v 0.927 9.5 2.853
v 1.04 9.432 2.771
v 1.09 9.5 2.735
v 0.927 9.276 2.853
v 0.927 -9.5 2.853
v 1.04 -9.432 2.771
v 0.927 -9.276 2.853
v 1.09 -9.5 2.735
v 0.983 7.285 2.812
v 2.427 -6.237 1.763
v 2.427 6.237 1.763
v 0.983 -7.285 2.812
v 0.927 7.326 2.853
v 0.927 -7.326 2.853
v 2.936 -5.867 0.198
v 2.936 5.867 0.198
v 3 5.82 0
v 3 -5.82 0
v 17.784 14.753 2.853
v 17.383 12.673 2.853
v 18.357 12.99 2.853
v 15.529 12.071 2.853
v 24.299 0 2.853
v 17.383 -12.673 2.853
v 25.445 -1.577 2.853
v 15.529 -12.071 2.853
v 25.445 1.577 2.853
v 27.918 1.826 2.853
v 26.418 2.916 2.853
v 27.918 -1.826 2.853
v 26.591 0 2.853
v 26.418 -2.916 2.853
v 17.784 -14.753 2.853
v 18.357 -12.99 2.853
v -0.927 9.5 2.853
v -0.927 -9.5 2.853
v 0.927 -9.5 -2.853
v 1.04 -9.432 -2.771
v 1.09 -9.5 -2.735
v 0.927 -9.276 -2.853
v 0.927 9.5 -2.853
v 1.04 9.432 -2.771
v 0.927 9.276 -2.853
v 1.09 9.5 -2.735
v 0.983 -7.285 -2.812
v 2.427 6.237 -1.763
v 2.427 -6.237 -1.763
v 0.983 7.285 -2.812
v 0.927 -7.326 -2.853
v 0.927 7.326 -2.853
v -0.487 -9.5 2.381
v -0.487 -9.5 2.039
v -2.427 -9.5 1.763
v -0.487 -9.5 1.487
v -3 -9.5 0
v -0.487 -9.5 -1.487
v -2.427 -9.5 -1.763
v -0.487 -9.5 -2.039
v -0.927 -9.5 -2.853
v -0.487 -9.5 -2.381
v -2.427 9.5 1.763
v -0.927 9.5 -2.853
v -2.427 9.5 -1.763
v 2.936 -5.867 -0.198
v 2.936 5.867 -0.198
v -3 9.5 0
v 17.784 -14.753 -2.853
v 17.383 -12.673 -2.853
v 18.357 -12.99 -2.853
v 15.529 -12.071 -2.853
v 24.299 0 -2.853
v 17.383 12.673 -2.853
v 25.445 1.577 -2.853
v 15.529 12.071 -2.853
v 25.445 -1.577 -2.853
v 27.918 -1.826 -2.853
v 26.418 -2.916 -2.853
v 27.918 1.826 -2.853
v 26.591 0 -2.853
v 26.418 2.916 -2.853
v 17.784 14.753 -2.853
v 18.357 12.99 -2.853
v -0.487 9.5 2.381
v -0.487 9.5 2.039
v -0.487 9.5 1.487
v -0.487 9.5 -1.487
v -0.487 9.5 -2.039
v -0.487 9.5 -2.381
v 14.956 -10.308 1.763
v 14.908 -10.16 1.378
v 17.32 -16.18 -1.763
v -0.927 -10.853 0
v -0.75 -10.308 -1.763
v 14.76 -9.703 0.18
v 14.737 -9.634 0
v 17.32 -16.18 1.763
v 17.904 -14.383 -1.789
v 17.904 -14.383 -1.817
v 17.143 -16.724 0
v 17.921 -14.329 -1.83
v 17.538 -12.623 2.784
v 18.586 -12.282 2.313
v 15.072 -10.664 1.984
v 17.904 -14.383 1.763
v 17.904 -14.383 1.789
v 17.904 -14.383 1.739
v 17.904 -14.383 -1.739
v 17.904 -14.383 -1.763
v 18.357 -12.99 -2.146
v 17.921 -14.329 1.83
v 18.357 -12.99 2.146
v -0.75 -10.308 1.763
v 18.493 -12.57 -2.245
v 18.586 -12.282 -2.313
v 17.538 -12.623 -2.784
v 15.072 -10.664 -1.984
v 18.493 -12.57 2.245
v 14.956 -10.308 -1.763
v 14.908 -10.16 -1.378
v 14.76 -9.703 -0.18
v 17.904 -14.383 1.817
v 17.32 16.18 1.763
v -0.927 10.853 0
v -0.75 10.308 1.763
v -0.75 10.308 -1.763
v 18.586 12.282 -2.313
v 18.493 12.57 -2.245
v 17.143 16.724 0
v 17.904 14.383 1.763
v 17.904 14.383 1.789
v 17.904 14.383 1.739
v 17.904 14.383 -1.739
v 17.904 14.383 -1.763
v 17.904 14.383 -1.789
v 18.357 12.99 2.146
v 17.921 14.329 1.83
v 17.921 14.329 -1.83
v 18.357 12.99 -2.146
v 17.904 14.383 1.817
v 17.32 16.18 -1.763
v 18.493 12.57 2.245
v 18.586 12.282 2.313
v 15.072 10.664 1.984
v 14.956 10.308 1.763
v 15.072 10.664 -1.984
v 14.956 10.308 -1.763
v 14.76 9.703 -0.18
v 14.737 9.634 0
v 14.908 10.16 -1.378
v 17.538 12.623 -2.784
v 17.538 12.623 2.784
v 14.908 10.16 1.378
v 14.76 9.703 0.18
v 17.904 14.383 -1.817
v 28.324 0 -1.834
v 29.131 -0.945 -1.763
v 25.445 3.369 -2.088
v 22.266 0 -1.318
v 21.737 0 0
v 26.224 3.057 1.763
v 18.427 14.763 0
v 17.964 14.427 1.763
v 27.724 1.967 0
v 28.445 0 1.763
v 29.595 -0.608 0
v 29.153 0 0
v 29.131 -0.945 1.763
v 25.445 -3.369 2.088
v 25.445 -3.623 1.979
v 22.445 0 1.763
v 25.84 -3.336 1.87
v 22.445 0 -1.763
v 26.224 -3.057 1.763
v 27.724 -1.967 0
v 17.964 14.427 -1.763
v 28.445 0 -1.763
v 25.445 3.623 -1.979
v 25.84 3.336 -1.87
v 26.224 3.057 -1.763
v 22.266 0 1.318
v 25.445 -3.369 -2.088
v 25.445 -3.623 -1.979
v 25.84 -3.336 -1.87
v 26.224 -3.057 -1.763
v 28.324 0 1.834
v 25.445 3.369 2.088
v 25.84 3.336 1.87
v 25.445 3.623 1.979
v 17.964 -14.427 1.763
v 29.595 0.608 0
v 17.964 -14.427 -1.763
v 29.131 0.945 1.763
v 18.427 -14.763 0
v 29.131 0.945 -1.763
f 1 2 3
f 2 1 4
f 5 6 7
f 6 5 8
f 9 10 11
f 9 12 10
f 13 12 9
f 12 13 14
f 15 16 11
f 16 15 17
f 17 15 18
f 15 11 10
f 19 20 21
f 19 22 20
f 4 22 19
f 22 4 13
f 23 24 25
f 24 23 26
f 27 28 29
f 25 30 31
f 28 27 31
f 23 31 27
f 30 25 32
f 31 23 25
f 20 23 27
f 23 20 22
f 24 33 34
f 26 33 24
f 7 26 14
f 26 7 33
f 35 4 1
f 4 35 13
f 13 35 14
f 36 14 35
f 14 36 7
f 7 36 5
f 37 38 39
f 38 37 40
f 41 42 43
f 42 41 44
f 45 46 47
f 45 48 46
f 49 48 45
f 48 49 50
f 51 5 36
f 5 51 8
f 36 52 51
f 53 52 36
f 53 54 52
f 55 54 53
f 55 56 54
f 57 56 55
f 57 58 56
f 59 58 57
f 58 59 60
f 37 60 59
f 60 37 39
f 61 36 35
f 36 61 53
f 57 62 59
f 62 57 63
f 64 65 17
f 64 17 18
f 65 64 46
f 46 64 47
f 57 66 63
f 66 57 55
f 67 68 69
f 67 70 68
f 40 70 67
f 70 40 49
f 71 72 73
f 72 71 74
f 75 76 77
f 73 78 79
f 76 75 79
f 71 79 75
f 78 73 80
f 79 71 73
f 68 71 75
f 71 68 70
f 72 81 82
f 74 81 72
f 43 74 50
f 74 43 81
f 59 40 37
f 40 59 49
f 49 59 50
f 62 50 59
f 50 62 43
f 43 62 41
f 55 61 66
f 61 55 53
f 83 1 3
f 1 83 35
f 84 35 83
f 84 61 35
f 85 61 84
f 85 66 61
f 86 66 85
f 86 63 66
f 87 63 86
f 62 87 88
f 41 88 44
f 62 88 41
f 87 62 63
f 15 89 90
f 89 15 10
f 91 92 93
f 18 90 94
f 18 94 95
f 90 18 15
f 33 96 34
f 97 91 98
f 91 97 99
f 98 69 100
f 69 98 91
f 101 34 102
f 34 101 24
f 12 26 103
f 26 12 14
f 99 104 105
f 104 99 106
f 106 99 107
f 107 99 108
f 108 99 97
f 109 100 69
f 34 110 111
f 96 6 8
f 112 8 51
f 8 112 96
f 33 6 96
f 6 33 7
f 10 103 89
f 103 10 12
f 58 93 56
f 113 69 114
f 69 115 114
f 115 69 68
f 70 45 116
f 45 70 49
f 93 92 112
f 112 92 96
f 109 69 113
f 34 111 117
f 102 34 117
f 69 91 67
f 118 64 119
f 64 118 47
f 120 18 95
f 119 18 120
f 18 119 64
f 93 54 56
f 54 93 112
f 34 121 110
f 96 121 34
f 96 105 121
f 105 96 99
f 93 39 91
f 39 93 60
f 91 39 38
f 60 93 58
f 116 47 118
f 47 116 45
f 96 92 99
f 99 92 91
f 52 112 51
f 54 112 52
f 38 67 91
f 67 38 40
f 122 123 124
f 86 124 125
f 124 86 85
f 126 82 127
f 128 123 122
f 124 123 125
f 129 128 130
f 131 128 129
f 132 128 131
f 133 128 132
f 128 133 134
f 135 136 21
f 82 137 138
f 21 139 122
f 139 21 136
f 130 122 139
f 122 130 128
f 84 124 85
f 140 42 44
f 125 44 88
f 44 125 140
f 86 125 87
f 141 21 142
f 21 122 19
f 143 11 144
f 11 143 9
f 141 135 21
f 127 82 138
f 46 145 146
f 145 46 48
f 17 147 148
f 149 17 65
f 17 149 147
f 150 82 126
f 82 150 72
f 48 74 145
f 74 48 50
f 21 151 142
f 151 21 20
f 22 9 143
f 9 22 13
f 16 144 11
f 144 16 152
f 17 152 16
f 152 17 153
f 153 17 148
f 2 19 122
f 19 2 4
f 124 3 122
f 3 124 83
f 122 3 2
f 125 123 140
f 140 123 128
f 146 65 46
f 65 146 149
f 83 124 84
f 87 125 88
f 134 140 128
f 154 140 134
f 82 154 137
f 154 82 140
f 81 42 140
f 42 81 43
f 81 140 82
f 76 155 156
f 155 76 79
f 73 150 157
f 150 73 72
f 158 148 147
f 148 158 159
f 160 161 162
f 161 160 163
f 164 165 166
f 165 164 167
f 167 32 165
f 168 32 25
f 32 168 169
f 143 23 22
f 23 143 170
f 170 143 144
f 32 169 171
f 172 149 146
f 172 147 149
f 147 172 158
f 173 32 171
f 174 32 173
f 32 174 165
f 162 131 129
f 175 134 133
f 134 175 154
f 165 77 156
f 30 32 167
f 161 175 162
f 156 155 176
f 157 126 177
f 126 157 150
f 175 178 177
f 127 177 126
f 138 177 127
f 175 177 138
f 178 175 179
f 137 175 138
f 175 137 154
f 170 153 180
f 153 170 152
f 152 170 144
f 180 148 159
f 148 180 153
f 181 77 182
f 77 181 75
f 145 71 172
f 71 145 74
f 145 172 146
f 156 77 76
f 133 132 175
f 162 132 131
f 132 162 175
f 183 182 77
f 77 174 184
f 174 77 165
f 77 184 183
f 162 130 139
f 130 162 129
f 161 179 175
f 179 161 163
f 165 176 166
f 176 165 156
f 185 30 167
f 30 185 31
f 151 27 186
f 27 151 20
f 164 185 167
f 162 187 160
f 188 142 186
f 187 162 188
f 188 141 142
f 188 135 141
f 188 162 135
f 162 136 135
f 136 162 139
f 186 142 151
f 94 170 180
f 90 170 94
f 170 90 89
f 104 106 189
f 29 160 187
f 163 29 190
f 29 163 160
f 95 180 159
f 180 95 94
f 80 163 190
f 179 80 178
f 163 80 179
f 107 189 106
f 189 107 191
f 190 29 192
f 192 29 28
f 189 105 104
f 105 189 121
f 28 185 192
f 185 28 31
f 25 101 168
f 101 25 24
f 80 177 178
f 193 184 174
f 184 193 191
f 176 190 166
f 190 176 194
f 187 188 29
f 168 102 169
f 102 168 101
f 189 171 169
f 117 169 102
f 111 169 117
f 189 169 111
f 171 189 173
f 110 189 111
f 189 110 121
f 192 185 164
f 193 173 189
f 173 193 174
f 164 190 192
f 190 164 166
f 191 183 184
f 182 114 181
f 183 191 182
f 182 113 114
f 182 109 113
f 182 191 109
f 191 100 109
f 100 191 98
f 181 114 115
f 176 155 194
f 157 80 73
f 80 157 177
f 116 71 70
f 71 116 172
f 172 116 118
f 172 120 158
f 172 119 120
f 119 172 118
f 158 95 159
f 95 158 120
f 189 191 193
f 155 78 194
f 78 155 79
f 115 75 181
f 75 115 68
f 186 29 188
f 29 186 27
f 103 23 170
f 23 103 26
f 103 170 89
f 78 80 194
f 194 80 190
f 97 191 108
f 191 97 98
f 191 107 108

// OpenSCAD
/*

 Паратемры кольца: 
 нижняя плашка около 12мм, вмещает 3 пластины по 4 мм, плотно. 

 К Вантам добавляет 26мм, 




*/


sideLen = 19;
sideThikn = 6;

//translate([-22, 0, 0])
Rig();


module Rig() {

    rotate([90,0,0])
    cylinder(h=sideLen, r=sideThikn/2, center=true);

    translate([0, -8, 0])
    rotate([90,0,72])
    cylinder(h=sideLen, r=sideThikn/2);
    
    translate([0, 8, 0])
    rotate([90,0, 180-72])
    cylinder(h=sideLen, r=sideThikn/2);
    
    translate([16, 13, 0])
    rotate([90,0, 36])
    cylinder(h=sideLen, r=sideThikn/2);
    
    translate([16, -13, 0])
    rotate([90,0, 180-36])
    cylinder(h=sideLen, r=sideThikn/2);
}
